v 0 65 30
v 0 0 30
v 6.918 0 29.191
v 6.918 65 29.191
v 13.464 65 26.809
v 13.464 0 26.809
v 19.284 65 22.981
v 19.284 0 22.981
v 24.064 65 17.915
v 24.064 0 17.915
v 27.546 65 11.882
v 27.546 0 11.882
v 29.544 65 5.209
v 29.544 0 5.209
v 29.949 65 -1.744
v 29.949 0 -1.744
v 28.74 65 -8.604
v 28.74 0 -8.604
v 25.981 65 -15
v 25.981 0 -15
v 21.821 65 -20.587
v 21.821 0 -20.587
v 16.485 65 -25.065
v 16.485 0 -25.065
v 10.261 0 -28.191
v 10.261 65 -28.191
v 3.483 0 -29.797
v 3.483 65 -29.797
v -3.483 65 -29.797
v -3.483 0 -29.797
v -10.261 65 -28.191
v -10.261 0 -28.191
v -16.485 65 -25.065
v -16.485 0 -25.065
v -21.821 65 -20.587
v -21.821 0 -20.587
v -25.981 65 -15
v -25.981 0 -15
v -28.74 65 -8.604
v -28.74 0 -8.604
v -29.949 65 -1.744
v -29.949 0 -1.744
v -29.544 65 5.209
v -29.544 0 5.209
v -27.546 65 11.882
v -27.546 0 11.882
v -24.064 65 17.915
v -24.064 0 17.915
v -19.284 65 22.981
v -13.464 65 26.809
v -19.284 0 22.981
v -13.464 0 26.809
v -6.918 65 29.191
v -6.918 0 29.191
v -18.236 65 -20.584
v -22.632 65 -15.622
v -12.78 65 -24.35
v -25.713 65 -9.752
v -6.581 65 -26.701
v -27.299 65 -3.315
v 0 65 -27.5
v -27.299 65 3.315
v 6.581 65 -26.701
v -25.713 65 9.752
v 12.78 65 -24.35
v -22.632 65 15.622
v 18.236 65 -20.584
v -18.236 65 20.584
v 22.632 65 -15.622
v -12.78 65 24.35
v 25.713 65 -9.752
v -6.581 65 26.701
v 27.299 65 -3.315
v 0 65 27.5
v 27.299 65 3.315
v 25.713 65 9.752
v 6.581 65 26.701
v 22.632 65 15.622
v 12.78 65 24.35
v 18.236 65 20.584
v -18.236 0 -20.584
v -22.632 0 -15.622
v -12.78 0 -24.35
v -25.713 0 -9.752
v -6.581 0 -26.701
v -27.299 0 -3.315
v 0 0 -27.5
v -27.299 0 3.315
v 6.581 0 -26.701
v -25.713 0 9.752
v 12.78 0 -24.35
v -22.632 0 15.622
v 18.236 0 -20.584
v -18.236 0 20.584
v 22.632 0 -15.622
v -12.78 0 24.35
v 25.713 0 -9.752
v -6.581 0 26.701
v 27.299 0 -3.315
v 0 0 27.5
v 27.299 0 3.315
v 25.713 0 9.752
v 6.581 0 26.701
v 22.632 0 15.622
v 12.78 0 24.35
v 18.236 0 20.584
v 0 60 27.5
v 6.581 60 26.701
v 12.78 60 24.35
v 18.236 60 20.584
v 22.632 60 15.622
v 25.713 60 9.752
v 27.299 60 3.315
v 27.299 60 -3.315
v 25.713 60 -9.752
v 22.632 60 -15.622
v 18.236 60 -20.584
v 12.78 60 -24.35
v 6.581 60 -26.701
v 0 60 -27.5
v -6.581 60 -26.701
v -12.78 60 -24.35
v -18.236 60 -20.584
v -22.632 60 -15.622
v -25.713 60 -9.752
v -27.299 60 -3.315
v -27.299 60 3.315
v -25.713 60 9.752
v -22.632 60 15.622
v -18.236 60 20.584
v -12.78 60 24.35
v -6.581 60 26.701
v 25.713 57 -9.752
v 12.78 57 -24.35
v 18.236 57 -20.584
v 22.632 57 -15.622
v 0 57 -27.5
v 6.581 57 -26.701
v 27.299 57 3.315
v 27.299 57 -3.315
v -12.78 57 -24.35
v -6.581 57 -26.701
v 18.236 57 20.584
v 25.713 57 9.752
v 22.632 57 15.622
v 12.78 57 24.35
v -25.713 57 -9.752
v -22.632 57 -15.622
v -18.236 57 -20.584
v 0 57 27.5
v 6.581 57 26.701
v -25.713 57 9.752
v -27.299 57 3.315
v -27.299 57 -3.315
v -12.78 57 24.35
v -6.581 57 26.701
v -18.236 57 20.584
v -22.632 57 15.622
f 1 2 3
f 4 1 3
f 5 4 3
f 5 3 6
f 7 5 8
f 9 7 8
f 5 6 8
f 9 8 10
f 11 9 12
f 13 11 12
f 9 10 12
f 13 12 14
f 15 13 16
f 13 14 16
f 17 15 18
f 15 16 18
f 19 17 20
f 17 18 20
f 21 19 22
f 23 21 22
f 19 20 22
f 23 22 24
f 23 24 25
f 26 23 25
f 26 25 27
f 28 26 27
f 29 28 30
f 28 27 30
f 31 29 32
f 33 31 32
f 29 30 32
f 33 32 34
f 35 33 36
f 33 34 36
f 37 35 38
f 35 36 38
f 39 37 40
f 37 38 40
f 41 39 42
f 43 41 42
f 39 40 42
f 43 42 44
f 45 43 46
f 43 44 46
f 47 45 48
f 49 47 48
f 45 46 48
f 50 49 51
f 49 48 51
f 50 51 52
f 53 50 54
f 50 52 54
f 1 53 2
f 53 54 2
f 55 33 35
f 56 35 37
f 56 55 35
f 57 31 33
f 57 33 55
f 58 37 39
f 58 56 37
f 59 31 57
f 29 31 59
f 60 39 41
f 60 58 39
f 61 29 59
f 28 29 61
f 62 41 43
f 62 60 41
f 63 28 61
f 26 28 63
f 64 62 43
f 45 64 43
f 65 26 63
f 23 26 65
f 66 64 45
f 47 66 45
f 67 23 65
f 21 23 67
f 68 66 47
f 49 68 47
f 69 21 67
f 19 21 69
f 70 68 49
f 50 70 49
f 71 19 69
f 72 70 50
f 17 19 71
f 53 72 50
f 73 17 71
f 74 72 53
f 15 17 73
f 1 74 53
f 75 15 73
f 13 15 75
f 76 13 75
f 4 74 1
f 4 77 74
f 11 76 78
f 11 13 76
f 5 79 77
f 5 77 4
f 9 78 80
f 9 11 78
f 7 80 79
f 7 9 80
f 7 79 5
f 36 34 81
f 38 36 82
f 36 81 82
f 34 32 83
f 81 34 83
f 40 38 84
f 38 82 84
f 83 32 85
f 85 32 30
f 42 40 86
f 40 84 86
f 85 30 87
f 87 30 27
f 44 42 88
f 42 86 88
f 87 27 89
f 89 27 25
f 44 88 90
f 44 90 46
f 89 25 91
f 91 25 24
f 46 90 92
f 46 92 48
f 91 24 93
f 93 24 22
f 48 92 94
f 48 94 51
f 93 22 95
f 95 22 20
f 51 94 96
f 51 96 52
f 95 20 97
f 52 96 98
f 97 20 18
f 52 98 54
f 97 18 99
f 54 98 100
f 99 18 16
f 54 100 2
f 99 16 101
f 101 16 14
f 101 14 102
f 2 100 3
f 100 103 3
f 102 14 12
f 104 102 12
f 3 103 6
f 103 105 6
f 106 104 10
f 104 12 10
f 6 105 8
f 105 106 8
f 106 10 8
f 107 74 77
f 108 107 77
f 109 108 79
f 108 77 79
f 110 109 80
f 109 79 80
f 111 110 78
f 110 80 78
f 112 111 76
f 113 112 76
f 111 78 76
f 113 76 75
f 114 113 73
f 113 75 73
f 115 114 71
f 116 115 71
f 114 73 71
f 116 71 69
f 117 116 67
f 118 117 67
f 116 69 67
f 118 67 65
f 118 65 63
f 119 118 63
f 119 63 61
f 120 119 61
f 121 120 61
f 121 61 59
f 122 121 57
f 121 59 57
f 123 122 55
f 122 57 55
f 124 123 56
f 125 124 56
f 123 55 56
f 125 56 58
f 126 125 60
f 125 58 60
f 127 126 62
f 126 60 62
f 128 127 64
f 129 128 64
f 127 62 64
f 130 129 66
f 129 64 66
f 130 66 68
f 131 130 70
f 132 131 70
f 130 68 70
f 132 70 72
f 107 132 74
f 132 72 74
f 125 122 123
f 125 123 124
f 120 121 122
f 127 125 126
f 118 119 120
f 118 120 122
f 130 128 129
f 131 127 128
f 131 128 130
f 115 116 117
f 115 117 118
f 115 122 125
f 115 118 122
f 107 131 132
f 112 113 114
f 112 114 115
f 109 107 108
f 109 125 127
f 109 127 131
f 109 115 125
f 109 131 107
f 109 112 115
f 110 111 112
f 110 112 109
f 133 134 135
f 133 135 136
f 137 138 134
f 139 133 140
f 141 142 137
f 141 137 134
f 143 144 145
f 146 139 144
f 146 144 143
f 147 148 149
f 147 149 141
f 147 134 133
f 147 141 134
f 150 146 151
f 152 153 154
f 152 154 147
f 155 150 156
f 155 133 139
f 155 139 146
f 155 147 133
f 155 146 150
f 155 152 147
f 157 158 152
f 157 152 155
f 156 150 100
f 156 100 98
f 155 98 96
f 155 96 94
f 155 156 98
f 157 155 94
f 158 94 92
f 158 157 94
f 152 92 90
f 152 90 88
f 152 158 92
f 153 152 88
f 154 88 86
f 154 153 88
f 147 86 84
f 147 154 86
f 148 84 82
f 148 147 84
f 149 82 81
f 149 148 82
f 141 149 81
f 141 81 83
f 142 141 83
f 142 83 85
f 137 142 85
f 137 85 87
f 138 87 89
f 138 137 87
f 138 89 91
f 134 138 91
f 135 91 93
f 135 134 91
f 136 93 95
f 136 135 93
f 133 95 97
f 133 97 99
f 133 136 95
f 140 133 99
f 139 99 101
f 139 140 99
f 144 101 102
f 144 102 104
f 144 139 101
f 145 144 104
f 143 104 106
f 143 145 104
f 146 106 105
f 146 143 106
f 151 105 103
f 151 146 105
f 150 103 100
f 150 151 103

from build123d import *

# Parameters (mm, degrees)
SKETCH_1_R          = 30
EXTRUDE_1_DEPTH     = 65
SKETCH_2_R          = 27.5
CUT_EXTRUDE_1_DEPTH = 5
CUT_EXTRUDE_START   = -57
SKETCH_3_R          = 27.5
CUT_EXTRUDE_2_DEPTH = 57


with BuildPart() as part:
    # 草图1 → 凸台-拉伸1 (new body)
    with BuildSketch(Plane(origin=(0, 0, 0), x_dir=(1, 0, 0), z_dir=(0, 1, 0))):
        with Locations(Location((0, 0, 0), (0, 0, 270))):
            Circle(SKETCH_1_R)
    extrude(amount=EXTRUDE_1_DEPTH)

    # 草图2 → 切除-拉伸1 (cut)
    with BuildSketch(Plane(origin=(0, 65, 0), x_dir=(1, 0, 0), z_dir=(0, 1, 0))):
        with Locations(Location((0, 0, 0), (0, 0, 270))):
            Circle(SKETCH_2_R)
    extrude(amount=-CUT_EXTRUDE_1_DEPTH, mode=Mode.SUBTRACT)

    # 草图3 → 切除-拉伸2 (cut)
    with BuildSketch(Plane.XZ.offset(CUT_EXTRUDE_START)):
        with Locations(Location((0, 0, 0), (0, 0, 90))):
            Circle(SKETCH_3_R)
    extrude(amount=CUT_EXTRUDE_2_DEPTH, mode=Mode.SUBTRACT)


solid = part.part
